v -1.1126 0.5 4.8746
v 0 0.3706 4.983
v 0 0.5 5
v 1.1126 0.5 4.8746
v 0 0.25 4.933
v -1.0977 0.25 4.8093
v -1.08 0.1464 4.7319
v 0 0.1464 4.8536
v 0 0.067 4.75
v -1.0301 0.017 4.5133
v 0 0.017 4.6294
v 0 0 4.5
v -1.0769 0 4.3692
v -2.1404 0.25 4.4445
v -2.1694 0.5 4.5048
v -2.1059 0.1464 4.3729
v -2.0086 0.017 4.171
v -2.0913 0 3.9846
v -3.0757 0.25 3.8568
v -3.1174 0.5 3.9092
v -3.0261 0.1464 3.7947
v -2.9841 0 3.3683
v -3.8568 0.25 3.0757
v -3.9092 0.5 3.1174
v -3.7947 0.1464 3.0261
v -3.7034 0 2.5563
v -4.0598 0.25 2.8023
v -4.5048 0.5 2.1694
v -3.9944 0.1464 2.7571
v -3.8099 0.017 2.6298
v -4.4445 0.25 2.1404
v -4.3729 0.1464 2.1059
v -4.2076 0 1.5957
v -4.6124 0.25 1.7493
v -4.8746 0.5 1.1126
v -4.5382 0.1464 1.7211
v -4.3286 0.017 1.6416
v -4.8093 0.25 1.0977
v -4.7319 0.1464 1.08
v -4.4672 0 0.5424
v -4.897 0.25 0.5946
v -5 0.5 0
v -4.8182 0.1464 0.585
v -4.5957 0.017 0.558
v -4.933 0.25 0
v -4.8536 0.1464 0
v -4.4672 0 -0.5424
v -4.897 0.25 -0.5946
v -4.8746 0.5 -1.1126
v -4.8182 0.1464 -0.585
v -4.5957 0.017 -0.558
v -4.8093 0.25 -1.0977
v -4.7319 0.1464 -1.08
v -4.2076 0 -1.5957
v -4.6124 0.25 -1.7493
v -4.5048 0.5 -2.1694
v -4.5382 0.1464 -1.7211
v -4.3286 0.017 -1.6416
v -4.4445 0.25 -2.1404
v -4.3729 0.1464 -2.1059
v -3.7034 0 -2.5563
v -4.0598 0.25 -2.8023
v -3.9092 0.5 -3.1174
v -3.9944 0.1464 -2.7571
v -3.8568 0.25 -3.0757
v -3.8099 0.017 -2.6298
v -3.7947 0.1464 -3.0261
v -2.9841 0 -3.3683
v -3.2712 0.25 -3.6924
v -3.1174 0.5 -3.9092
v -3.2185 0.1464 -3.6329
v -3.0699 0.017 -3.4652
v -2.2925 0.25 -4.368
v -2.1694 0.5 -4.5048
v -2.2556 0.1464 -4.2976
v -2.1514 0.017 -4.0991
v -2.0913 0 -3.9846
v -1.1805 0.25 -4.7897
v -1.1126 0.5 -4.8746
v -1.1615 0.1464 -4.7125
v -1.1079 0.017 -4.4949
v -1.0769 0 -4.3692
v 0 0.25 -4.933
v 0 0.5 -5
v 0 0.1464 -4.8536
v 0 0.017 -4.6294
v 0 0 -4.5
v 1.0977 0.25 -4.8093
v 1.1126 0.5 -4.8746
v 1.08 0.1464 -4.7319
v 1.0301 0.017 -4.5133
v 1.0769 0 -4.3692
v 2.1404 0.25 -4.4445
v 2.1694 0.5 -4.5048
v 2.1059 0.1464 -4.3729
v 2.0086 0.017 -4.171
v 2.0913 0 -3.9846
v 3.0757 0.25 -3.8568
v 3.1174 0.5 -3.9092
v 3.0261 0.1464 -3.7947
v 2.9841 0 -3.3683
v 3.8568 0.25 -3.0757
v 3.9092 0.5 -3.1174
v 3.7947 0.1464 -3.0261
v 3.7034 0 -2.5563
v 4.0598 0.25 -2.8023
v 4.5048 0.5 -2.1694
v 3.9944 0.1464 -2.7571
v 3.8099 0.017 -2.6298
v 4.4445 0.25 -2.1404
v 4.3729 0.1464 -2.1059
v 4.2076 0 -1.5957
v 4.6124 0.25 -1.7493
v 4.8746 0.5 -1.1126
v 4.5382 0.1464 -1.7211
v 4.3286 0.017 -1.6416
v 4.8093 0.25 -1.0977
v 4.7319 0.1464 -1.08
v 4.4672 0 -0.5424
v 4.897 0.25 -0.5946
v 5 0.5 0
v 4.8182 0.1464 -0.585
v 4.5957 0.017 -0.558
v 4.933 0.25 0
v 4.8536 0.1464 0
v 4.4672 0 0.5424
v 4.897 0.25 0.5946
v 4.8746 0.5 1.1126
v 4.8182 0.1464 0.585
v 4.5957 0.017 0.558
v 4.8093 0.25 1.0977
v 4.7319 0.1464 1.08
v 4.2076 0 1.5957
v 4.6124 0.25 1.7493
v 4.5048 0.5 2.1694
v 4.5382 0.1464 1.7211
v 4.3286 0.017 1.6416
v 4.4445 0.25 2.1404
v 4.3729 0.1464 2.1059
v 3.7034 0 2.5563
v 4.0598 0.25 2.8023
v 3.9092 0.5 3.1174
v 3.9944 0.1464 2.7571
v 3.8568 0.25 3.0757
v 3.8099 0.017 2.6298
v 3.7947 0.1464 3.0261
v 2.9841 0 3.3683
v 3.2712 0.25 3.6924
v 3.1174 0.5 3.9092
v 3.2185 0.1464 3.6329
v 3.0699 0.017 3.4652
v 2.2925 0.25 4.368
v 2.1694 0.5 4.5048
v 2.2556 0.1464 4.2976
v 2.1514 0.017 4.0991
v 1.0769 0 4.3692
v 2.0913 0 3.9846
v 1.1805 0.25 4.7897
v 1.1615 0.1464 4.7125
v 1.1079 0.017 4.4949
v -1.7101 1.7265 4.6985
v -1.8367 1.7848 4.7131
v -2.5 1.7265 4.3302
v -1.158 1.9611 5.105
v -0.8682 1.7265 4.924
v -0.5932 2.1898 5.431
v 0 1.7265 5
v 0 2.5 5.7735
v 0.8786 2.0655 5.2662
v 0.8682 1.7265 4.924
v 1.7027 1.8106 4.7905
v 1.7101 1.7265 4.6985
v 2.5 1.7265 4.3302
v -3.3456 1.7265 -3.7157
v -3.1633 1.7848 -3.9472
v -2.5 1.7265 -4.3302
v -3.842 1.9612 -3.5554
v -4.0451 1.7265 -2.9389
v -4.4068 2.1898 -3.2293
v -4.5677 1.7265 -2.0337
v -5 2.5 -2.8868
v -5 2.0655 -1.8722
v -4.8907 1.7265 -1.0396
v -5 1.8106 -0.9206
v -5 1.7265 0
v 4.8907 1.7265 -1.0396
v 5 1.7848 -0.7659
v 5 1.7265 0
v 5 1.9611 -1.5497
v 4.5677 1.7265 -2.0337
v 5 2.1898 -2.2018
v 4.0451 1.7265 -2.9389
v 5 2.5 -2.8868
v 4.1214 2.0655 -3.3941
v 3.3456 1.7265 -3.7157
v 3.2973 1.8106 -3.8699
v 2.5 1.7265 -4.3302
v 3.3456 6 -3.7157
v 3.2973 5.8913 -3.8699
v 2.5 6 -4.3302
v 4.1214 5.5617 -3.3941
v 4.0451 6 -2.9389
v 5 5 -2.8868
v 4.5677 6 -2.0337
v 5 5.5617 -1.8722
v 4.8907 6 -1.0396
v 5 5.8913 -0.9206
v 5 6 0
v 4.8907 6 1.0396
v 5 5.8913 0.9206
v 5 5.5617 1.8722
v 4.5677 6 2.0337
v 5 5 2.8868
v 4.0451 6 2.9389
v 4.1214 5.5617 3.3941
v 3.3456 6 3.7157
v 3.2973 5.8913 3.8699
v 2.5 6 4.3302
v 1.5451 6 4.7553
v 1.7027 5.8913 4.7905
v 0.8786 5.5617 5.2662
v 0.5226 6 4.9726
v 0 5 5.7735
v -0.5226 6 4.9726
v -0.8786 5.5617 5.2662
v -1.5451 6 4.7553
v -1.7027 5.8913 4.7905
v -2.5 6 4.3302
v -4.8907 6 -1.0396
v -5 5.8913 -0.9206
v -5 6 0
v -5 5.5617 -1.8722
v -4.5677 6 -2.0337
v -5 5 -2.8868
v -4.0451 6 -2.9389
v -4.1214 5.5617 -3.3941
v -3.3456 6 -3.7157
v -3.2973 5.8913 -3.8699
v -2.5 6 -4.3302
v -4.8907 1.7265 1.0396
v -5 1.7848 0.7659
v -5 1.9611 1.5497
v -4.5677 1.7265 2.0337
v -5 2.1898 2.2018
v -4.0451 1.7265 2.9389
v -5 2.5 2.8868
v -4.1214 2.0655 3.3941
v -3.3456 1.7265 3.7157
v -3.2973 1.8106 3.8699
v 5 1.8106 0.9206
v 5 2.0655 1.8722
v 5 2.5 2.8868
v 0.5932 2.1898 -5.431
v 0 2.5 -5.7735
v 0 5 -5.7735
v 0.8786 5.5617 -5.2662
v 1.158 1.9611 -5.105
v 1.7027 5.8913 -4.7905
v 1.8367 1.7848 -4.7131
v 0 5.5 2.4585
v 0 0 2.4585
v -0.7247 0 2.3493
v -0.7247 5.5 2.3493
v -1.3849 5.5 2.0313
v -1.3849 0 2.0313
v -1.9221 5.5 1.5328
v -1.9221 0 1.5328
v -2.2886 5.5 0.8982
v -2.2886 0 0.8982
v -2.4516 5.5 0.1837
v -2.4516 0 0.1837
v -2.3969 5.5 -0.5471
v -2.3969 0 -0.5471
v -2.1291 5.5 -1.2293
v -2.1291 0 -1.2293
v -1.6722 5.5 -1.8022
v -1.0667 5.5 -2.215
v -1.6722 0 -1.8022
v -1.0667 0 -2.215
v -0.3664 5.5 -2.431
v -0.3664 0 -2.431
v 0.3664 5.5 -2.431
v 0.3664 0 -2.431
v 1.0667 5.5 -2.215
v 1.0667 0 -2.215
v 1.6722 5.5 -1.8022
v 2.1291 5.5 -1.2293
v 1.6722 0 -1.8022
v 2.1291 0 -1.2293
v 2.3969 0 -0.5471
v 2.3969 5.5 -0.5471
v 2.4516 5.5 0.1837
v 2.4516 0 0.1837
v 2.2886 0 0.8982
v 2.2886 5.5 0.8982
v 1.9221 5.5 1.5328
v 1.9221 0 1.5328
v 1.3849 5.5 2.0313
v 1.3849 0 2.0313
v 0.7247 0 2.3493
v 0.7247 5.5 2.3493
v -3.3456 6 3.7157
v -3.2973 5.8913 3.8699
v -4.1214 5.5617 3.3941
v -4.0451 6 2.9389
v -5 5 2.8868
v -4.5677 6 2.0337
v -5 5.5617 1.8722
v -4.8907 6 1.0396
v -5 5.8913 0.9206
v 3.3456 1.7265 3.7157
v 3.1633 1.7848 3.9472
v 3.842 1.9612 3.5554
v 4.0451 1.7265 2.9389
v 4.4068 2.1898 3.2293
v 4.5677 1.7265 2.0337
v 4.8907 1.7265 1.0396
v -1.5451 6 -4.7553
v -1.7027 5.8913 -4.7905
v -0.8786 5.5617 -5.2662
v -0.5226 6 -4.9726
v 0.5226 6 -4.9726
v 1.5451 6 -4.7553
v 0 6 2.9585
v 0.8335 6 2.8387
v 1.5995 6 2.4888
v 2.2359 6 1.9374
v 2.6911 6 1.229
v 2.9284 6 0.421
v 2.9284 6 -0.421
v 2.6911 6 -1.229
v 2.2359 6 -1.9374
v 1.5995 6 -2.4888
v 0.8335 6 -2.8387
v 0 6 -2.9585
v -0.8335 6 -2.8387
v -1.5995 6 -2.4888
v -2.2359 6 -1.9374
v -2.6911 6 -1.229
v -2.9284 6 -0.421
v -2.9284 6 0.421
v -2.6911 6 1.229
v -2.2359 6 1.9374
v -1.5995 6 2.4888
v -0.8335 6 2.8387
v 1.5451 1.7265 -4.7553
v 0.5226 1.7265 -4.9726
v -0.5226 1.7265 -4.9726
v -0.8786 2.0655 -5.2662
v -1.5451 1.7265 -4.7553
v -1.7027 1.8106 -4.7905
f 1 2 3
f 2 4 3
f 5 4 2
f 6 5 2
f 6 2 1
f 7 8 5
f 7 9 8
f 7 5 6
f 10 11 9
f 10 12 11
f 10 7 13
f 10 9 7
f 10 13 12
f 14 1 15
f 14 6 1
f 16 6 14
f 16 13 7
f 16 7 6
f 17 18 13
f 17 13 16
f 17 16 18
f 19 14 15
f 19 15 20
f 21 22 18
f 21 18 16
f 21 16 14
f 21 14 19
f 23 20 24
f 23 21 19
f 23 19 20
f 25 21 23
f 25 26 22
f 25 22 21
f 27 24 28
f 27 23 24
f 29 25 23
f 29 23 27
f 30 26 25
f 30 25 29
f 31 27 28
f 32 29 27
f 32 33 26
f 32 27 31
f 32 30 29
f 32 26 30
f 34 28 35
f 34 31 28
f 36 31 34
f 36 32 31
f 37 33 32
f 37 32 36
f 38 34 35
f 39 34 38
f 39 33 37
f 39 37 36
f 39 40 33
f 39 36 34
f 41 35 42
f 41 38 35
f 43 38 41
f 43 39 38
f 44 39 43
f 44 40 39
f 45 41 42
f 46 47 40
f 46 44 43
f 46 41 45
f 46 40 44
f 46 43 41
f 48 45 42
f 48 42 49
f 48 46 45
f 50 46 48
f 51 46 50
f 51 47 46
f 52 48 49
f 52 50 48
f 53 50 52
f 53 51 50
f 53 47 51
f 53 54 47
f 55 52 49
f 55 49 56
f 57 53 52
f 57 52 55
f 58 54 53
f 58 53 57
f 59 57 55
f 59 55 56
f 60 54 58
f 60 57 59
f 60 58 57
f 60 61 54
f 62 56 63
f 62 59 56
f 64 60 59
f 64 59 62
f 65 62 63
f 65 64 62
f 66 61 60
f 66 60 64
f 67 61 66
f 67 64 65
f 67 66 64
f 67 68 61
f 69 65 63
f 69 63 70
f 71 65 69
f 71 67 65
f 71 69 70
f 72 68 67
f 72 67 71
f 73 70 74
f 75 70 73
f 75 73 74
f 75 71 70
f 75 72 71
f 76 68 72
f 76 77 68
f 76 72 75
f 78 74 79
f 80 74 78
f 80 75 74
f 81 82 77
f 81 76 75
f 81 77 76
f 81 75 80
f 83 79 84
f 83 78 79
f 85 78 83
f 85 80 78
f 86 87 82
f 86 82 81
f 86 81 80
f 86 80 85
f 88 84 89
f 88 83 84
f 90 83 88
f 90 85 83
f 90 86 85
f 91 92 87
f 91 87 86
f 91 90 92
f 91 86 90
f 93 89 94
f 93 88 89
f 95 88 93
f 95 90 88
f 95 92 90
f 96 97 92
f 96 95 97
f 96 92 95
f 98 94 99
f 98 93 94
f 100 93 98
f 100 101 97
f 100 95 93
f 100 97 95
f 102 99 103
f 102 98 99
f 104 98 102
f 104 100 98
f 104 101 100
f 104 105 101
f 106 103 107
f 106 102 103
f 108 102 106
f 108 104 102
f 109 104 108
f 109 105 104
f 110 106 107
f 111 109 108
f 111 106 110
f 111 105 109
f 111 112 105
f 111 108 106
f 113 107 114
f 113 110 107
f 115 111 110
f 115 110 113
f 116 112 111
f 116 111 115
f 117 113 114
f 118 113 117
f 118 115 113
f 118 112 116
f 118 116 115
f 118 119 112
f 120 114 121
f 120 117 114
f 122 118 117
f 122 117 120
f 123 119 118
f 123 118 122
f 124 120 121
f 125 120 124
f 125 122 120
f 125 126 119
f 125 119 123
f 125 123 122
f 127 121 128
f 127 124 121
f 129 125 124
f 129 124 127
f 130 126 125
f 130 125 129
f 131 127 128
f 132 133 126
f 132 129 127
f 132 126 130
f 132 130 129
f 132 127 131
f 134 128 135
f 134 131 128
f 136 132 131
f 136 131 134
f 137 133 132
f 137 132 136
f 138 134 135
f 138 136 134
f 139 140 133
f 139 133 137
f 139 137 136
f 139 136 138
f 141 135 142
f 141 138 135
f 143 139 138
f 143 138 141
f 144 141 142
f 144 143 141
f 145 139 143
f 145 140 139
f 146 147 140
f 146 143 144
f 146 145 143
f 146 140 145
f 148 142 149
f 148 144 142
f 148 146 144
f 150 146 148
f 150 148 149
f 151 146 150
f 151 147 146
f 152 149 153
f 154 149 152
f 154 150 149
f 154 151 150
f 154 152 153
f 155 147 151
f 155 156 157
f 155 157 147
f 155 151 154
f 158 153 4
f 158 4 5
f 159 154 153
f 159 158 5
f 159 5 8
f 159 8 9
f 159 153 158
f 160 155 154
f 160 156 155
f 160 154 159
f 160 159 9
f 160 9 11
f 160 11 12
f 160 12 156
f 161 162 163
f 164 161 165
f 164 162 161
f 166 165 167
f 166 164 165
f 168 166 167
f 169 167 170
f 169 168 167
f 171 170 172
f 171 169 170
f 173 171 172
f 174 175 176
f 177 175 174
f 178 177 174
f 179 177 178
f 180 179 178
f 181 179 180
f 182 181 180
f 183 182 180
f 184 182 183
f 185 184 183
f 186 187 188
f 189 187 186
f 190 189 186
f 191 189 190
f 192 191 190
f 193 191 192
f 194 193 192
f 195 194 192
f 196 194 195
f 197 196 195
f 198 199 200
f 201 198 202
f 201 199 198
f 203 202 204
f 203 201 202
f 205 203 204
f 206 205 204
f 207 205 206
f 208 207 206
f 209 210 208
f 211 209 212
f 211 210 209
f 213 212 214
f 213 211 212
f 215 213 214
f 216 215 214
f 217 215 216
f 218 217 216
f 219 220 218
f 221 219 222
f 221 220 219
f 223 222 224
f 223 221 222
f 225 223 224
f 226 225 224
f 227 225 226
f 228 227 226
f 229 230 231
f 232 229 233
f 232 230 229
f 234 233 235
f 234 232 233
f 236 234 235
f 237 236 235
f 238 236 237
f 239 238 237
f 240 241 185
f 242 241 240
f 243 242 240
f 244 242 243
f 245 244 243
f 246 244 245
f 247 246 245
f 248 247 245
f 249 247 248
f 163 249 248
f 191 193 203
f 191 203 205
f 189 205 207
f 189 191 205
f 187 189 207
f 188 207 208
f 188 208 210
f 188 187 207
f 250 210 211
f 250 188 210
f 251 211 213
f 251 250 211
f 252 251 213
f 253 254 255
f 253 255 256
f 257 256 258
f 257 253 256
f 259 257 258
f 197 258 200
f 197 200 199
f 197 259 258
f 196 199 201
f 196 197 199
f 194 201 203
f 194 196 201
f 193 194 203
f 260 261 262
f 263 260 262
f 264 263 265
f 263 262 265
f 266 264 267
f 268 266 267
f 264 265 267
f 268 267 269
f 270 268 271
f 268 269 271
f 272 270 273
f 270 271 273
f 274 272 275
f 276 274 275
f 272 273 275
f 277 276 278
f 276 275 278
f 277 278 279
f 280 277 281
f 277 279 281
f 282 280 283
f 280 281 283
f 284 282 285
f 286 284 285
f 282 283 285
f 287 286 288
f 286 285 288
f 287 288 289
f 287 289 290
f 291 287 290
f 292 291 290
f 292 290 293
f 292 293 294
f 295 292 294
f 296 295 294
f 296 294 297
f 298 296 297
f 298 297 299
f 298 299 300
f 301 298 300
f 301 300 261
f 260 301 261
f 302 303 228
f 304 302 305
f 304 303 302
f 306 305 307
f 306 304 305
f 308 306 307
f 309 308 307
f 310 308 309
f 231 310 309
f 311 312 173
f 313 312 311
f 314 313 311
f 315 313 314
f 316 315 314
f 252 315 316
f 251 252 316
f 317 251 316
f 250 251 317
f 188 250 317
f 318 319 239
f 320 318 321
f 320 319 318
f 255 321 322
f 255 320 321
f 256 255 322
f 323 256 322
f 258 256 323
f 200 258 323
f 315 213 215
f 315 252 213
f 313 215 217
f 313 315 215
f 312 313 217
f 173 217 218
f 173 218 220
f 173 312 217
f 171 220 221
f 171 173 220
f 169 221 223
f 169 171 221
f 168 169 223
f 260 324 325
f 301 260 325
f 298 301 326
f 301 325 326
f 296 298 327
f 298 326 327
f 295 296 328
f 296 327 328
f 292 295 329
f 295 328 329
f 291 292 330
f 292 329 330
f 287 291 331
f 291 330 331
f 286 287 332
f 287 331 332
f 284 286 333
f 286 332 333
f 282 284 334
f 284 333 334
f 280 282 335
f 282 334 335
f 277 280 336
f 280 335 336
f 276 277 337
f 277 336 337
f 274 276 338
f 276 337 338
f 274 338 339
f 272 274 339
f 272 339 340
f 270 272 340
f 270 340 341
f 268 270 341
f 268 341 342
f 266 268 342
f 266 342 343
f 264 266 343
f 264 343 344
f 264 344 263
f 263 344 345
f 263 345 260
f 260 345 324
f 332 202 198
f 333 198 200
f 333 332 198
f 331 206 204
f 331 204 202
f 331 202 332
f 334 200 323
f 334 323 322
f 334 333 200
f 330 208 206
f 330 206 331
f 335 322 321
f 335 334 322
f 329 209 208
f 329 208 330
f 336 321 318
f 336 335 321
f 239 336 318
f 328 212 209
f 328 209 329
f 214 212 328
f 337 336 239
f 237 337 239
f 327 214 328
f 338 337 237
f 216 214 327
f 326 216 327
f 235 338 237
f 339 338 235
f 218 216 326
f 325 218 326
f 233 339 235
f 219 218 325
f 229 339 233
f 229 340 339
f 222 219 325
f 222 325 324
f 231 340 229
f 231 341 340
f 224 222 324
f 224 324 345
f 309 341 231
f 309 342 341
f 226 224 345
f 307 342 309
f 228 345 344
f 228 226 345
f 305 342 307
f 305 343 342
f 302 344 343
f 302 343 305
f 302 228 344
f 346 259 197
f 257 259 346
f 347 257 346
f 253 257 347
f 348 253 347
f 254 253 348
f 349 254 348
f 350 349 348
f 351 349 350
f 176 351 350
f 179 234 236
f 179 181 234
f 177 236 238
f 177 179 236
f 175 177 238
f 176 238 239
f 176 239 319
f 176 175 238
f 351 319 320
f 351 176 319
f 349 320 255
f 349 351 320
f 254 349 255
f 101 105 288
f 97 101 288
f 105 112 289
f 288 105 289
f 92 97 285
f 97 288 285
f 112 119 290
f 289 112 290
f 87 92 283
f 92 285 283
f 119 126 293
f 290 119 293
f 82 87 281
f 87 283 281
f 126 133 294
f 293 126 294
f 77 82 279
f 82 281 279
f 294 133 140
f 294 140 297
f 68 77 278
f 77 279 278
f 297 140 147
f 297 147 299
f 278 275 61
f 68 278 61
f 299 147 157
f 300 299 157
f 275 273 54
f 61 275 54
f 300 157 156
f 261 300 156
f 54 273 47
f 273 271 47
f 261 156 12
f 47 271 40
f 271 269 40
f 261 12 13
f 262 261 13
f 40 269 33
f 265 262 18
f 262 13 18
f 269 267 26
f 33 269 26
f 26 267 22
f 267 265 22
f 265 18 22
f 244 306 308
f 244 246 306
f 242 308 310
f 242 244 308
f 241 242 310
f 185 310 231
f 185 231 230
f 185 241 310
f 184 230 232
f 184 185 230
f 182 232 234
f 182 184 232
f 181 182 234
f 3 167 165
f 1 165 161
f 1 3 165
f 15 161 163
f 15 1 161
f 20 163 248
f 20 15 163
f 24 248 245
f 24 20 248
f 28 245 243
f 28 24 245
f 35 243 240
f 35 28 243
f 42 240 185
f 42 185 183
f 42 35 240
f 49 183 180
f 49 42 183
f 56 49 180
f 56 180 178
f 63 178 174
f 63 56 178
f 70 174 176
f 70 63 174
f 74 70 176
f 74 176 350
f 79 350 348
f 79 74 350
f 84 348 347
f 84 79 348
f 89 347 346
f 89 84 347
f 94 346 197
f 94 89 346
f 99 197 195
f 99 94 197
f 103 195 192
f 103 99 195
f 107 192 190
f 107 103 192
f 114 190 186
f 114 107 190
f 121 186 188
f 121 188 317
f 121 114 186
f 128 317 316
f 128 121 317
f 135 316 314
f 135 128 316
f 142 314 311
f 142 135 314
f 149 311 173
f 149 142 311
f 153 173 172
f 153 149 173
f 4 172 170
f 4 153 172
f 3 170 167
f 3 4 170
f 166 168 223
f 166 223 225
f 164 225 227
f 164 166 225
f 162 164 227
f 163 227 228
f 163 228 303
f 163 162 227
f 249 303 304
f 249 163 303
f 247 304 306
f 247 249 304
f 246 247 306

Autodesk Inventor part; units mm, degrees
ref_plane "YZ Plane" through (0, 0, 0) normal (1, 0, 0) x (0, 1, 0)
ref_plane "XZ Plane" through (0, 0, 0) normal (0, 1, 0) x (-1, 0, 0)
ref_plane "XY Plane" through (0, 0, 0) normal (0, 0, 1) x (1, 0, 0)
sketch "Sketch1" plane through (0, 0, 0) normal (0, 1, 0) x (-1, 0, 0)
  line L0 (5, 2.8868) -> (5, -2.8868)
  line L1 (5, -2.8868) -> (0, -5.7735)
  line L2 (0, -5.7735) -> (-5, -2.8868)
  line L3 (-5, -2.8868) -> (-5, 2.8868)
  line L4 (-5, 2.8868) -> (0, 5.7735)
  line L5 (0, 5.7735) -> (5, 2.8868)
  point P0 (0, 0)
  point P1 (0, 0)
  dimension "d0" = 10
extrude "Extrusion1" add sketch "Sketch1" along normal blind 6
sketch "Sketch2" plane through (0, 6, 0) normal (0, 1, 0) x (1, 0, 0)
  point P0 (0, 0)
  point P1 (0, 0)
hole "Hole1" at (0, 6, 0) direction (0, -1, 0) diameter 4.917 end through all thread size "M6x1" class "6H" standard "ISO Metric profile"
sketch "Sketch3" plane through (0, 0, 0) normal (1, 0, 0) x (0, 1, 0)
  line L0 (0, 0) -> (9.121, 0)
  line L1 (0, 5.7735) -> (6, 5.7735) projected
  line L2 (2.5, 5.7735) -> (1.7265, 5)
  line L3 (1.7265, 5) -> (0, 5)
  line L4 (0, 5) -> (0, 5.7735)
  line L5 (6, 5.7735) -> (6, 2.8868) projected
  dimension "d10" = 10
  dimension "d11" = 3.5
  dimension "d12" = 45
revolve "Revolution1" cut sketch "Sketch3" angle 360 about axis through (0, 0, 0) along (0, 1, 0)
fillet "Fillet1" radius 0.5 1 edges at (0, 0, -5)
sketch "Sketch4" plane through (0, 0, 0) normal (0, -1, 0) x (1, 0, 0)
  circle A0 centre (0, 0) radius 4.5 projected
  circle A1 centre (0, 0) radius 3.75
  dimension "d15" = 7.5
split_face "Split1"
sketch "Sketch5" plane through (0, 0, 0) normal (1, 0, 0) x (0, 1, 0)
  line L0 (0, 0) -> (10.6904, 0)
  line L1 (2.5, 5.7735) -> (6, 5.7735) projected
  line L2 (5, 5.7735) -> (6, 5)
  line L3 (6, 5) -> (6, 5.7735)
  line L4 (6, 5) -> (10.4328, 5)
  dimension "d16" = 1
  dimension "d17" = 10
revolve "Revolution2" cut sketch "Sketch5" angle 360 about axis through (0, 0, 0) along (0, 1, 0)
chamfer "Chamfer1" distance 0.5 angle 45 1 edges at (0, 6, -2.4585)
properties part number "M6 nyloc" material "Steel, Carbon"
